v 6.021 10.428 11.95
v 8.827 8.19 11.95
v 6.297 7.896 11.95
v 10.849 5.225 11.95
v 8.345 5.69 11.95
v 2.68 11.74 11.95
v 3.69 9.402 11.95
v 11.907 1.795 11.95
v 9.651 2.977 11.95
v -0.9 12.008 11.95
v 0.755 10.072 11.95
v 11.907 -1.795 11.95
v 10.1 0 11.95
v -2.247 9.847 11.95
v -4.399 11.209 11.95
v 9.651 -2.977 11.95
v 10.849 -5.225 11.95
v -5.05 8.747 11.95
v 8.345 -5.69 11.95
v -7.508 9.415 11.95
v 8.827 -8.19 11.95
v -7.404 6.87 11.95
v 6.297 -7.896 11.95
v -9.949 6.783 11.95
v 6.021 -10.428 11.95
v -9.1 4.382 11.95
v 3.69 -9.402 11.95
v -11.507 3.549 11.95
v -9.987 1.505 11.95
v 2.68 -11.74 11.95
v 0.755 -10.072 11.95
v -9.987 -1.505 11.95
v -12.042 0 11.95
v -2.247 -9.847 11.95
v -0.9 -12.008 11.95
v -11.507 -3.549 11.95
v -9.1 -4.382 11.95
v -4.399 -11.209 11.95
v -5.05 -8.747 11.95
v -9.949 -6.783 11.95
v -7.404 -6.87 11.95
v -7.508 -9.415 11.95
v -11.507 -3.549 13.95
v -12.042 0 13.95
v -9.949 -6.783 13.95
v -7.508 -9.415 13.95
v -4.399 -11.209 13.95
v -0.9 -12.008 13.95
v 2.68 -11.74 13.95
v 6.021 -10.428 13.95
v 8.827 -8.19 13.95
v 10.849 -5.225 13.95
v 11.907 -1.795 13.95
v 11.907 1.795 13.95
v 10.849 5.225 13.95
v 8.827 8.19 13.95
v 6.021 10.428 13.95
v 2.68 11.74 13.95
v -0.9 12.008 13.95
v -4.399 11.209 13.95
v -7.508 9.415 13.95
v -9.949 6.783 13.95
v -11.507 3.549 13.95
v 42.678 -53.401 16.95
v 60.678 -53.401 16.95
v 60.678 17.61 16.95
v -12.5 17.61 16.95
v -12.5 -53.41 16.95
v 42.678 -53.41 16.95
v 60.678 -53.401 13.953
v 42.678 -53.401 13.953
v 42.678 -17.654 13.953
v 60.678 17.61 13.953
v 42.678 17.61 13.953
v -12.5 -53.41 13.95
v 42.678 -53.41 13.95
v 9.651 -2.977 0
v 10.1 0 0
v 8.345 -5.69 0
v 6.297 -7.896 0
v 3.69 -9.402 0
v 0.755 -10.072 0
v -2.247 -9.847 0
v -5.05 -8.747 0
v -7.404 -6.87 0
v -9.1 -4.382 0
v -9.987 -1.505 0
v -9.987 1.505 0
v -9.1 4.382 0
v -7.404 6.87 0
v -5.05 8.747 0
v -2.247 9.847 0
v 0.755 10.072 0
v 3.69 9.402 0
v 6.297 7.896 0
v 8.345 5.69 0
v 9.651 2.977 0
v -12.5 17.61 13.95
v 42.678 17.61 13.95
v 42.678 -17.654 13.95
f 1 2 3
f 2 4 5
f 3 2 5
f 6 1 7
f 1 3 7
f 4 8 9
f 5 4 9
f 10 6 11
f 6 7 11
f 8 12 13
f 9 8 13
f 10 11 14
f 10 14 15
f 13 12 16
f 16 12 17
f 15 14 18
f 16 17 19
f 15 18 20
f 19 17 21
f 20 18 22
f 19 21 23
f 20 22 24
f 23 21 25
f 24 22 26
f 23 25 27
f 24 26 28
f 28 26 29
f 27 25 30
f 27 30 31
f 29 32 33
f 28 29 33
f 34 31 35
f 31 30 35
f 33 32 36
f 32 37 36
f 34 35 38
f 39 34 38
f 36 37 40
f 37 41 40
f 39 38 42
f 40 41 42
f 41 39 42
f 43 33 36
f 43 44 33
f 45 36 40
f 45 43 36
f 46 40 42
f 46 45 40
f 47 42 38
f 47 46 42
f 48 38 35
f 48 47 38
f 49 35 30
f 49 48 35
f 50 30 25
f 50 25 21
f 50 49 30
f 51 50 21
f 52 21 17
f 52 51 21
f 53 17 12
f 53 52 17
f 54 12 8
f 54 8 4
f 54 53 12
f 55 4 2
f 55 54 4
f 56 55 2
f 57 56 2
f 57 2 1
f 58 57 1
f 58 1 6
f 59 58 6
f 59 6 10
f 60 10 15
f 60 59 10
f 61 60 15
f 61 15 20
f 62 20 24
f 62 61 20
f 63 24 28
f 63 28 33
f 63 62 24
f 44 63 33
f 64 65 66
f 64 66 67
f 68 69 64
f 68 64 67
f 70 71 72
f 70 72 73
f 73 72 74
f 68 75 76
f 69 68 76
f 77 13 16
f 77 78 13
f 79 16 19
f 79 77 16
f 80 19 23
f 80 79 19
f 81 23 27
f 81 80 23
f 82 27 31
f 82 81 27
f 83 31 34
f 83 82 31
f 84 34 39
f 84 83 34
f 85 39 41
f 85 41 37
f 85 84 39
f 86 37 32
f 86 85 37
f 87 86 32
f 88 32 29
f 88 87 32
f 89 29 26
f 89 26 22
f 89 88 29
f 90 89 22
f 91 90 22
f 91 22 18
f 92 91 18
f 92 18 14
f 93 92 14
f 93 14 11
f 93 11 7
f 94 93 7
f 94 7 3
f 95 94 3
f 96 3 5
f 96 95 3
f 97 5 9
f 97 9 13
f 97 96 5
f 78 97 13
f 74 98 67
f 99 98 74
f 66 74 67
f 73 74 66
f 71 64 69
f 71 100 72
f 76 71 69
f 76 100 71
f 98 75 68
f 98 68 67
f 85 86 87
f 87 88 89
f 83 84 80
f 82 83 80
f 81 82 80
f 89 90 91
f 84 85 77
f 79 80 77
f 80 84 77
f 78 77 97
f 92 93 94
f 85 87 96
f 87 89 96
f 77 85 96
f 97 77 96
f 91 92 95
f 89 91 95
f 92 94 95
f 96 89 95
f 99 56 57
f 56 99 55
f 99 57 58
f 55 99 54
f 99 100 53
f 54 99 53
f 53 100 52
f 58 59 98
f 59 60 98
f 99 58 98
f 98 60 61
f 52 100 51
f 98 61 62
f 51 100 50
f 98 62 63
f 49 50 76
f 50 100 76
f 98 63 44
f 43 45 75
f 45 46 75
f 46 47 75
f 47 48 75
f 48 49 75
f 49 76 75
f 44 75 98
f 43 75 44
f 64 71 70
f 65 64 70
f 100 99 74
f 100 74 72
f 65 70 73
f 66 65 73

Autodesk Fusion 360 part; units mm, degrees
sketch "Sketch1" plane through (0, 0, 0) normal (0, 0, 1) x (1, 0, 0)
  circle A0 centre (0, 0) radius 10.1
  dimension "d1" = 20.2
extrude "Extrude1" add sketch "Sketch1" along normal blind 13.95
sketch "Sketch2" plane through (0, 0, 13.95) normal (0, 0, 1) x (-1, 0, 0)
  circle A0 centre (0, 0) radius 10.1
  circle A1 centre (0, 0) radius 17.5
  line L0 (-27.5, -17.6099) -> (27.5, -17.6099)
  line L1 (27.5, -17.6099) -> (27.5, 17.6099)
  line L2 (27.5, 17.6099) -> (-27.5, 17.6099)
  line L3 (-27.5, 17.6099) -> (-27.5, -17.6099)
  line L4 (-27.5, -17.6099) -> (27.5, 17.6099) construction
  line L5 (27.5, -17.6099) -> (-27.5, 17.6099) construction
  line L6 (-27.5, -17.6099) -> (-42.678, -17.6099)
  line L7 (-42.678, -17.6099) -> (-42.678, 17.6539)
  line L8 (-42.678, 17.6539) -> (-27.5, 17.6539)
  line L9 (-27.5, 17.6539) -> (-27.5, -17.6099)
  dimension "d4" = 35
  dimension "d7" = 55
extrude "Extrude2" add sketch "Sketch2" along normal blind 2 contours A0 | A1
extrude "Extrude3" add sketch "Sketch2" along normal blind 2 contours L0 L1 L2 L3 L9
sketch "Sketch3" plane through (0, 0, 13.95) normal (0, 0, 1) x (-1, 0, 0)
  circle A0 centre (11.0543, 10.2607) radius 1.5
  dimension "d10" = 3
extrude "Extrude4" add sketch "Sketch2" along normal blind 2 contours L3 L6 L7 L8 L9
sketch "Sketch5" plane through (0, -17.6099, 0) normal (0, -1, 0) x (1, 0, 0)
  line L0 (-27.5, 13.95) -> (27.5, 13.95)
  line L1 (27.5, 13.95) -> (27.5, 15.95)
  line L2 (27.5, 15.95) -> (-27.5, 15.95)
  line L3 (-27.5, 15.95) -> (-27.5, 13.95)
  line L4 (-27.5, 15.95) -> (42.6781, 15.95)
  line L5 (42.6781, 15.95) -> (42.6781, 13.95)
  line L6 (42.6781, 13.95) -> (-27.5, 13.95)
  line L7 (-27.5, 13.95) -> (-27.5, 15.95)
extrude "Extrude5" add sketch "Sketch5" along normal blind 35.8
sketch "Sketch6" plane through (42.678, 0, 0) normal (1, 0, 0) x (0, 1, 0)
  line L0 (-17.6099, 15.95) -> (-17.6099, 13.95)
  line L1 (-17.6099, 13.95) -> (17.6099, 13.95)
  line L2 (17.6099, 13.95) -> (17.6099, 15.95)
  line L3 (17.6099, 15.95) -> (-17.6099, 15.95)
  line L4 (17.6099, 15.95) -> (-53.4009, 15.95)
  line L5 (-53.4009, 15.95) -> (-53.4009, 13.9526)
  line L6 (-53.4009, 13.9526) -> (17.6099, 13.9526)
  line L7 (17.6099, 13.9526) -> (17.6099, 15.95)
extrude "Extrude6" add sketch "Sketch6" along normal blind 18 contours L0 L2 L3 L4 L6 L7 | L0 L4 L5 L6
sketch "Sketch7" plane through (-27.5, 0, 0) normal (-1, 0, 0) x (0, -1, 0)
  line L0 (-17.6099, 13.95) -> (53.4099, 13.95)
  line L1 (53.4099, 13.95) -> (53.4099, 15.95)
  line L2 (53.4099, 15.95) -> (-17.6099, 15.95)
  line L3 (-17.6099, 15.95) -> (-17.6099, 13.95)
  line L4 (-17.6099, 15.95) -> (53.4099, 15.95)
  line L5 (53.4099, 15.95) -> (53.4099, 13.95)
  line L6 (53.4099, 13.95) -> (-17.6099, 13.95)
  line L7 (-17.6099, 13.95) -> (-17.6099, 15.95)
extrude "Extrude7" cut sketch "Sketch7" against normal blind 15
sketch "Sketch8" plane through (0, 0, 13.95) normal (0, 0, 1) x (-1, 0, 0)
  circle A0 centre (0, 0) radius 12.0416
extrude "Extrude8" add sketch "Sketch8" against normal blind 2
extrude "Extrude9" add 1 faces at (30.2854, -6.0604, 15.95) along direction (0, 0, 1) blind 1
